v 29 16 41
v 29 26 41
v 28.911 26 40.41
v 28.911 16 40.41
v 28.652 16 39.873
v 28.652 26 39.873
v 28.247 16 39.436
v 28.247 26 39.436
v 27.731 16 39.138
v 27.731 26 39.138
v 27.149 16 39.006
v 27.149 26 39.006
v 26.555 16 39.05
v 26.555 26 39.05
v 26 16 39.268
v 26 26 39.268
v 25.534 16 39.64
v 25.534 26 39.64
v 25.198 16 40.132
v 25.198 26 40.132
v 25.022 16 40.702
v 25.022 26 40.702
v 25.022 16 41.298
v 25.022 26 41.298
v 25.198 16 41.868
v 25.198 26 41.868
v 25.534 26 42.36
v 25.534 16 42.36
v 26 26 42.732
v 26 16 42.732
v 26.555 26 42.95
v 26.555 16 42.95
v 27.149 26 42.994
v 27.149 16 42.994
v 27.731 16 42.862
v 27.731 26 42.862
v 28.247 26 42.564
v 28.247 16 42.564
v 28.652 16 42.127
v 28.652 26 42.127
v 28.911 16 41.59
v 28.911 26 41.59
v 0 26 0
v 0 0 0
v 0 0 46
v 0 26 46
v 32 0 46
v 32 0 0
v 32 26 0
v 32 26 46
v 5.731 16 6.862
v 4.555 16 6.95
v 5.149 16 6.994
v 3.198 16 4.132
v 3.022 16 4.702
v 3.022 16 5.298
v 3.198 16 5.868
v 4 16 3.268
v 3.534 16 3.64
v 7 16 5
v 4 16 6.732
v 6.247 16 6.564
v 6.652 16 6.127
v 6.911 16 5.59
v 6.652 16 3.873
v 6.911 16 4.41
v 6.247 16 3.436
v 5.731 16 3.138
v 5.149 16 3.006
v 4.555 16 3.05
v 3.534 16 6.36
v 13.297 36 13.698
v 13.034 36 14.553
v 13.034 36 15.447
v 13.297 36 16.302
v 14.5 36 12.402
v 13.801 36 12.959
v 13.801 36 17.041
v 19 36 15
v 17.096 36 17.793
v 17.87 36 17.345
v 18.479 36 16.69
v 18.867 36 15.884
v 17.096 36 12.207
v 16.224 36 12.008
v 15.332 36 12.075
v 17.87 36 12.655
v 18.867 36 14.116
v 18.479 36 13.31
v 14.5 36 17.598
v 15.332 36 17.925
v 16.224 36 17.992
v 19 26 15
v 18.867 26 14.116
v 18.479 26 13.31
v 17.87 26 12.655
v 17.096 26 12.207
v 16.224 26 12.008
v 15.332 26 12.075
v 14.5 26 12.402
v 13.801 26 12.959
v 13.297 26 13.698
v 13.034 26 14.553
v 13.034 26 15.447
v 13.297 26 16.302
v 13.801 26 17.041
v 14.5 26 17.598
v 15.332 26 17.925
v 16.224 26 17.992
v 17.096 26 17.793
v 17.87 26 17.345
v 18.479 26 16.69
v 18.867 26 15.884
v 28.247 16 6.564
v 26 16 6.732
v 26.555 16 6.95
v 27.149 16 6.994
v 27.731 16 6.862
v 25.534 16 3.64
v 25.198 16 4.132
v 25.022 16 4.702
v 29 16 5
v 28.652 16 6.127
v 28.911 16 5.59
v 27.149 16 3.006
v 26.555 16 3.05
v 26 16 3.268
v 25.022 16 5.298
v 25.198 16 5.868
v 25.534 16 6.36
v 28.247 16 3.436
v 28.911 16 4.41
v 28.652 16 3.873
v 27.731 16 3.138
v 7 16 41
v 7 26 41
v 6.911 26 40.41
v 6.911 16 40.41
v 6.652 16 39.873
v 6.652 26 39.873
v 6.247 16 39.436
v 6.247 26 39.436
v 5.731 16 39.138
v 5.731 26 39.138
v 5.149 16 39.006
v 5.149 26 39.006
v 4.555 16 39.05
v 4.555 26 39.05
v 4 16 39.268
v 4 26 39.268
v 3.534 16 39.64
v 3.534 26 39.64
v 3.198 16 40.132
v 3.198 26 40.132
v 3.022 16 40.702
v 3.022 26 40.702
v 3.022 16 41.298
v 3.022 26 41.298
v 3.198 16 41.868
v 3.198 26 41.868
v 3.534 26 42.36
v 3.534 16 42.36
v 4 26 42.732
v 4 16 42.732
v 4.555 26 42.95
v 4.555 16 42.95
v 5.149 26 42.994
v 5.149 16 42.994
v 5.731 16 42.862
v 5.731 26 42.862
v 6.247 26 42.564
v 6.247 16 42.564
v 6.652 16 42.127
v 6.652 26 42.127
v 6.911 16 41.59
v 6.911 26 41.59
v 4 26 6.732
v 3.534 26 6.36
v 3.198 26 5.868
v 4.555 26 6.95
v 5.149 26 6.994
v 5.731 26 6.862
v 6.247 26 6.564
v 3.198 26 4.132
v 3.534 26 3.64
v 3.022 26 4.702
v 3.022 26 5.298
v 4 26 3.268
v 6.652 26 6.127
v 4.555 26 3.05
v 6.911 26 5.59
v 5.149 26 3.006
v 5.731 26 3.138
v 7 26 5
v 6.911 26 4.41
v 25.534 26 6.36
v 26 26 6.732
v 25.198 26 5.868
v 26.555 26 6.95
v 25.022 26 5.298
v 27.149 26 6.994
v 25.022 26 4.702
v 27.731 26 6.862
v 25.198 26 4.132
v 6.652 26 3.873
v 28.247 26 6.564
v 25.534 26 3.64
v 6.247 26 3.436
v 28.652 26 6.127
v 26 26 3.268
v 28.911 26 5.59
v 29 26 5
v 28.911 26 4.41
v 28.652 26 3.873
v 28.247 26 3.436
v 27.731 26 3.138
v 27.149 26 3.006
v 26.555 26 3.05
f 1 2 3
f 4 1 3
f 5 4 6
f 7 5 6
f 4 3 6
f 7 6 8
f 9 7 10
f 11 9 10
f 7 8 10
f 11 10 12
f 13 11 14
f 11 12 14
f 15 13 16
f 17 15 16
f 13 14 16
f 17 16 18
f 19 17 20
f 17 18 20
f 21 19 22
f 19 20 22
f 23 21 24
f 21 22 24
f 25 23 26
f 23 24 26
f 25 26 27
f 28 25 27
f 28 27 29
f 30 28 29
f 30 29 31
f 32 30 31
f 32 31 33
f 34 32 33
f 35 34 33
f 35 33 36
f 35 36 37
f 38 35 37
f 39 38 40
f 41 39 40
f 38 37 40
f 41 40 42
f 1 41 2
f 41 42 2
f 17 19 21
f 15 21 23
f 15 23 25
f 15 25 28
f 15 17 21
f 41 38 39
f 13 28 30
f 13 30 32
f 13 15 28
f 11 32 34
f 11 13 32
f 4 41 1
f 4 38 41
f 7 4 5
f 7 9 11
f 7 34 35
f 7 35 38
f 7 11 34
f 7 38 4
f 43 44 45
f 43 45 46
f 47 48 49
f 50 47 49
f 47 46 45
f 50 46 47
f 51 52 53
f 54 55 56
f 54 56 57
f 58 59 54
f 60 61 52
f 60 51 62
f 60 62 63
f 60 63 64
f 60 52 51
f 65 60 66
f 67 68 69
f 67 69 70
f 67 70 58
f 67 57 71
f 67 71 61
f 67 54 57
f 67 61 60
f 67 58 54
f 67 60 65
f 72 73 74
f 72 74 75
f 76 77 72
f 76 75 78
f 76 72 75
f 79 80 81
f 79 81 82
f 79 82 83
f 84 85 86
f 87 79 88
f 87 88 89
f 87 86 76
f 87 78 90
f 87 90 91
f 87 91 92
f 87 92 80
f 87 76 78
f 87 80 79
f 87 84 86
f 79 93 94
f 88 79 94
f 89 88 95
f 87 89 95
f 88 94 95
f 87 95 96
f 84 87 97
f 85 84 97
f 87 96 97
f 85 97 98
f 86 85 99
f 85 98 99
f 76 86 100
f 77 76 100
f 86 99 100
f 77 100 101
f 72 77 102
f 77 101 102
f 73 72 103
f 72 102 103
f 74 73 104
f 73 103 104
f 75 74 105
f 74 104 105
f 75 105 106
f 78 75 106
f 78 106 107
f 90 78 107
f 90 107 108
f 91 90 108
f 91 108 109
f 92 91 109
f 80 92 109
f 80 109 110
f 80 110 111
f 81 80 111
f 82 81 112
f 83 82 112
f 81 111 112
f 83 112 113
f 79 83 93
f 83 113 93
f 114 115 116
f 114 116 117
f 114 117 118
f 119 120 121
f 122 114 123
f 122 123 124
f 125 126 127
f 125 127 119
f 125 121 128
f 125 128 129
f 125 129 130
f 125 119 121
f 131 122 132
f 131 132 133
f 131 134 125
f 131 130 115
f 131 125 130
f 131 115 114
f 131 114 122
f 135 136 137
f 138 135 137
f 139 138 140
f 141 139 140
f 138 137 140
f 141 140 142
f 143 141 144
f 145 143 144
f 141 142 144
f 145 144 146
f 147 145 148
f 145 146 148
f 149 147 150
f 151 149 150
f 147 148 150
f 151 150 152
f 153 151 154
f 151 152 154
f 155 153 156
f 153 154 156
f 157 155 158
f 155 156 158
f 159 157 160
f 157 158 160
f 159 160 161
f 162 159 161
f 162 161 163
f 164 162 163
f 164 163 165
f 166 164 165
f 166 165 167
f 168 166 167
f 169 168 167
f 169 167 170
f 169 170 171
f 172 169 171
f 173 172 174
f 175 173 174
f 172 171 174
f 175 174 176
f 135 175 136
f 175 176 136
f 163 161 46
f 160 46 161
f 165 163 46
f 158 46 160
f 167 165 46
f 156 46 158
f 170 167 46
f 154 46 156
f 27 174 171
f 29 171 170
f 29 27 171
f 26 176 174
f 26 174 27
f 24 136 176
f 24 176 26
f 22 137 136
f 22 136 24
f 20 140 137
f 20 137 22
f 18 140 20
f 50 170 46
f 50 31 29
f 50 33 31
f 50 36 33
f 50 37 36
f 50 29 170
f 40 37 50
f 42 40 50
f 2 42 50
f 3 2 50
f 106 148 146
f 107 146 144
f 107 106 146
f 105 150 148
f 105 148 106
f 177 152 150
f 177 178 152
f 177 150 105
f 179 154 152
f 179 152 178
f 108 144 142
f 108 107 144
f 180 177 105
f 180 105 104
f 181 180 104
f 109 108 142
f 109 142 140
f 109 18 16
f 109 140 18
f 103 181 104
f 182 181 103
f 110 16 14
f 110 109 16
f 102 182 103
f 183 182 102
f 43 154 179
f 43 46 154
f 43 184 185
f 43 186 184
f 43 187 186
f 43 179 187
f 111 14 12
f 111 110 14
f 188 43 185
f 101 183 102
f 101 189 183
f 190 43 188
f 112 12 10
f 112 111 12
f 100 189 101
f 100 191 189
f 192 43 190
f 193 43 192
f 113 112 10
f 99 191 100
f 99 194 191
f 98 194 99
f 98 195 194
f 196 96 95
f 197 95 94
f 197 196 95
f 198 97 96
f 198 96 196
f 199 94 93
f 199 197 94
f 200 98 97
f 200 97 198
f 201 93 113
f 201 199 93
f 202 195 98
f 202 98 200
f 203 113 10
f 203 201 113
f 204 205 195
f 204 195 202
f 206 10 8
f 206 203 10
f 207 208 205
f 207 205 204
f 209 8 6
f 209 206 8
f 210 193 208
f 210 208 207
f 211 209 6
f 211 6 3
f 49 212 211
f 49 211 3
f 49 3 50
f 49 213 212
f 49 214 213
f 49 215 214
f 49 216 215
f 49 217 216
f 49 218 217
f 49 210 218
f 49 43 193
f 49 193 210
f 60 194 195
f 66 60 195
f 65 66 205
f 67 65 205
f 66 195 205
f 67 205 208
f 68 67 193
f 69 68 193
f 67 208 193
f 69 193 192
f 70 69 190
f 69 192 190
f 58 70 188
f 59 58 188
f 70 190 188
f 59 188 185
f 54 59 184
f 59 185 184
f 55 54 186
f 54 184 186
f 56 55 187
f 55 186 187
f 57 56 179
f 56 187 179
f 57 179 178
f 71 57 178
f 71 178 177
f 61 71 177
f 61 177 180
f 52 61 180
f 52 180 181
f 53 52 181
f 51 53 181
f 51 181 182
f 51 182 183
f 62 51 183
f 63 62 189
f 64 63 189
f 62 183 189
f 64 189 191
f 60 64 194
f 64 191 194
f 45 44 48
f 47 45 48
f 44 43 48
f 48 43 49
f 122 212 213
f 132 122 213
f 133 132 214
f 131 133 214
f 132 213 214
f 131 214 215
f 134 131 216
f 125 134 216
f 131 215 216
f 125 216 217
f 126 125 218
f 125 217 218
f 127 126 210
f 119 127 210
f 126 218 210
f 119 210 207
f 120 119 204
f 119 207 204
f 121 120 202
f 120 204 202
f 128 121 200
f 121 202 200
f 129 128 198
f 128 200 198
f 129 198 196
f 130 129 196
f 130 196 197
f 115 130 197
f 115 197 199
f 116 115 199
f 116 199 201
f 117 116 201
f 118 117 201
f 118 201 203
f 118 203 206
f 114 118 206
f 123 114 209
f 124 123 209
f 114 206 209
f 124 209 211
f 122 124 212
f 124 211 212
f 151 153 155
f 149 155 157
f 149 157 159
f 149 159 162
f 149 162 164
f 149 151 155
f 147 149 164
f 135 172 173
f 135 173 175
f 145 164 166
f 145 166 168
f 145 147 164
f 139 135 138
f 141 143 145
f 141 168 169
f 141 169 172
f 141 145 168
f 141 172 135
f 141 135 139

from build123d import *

# Parameters (mm, degrees)
SKETCH2_W            = 32
SKETCH2_H            = 26
BASE_DEPTH           = 46
SKETCH3_R            = 2
MOUNTING_HOLES_DEPTH = 10
SKETCH4_R            = 3
AXLE_DEPTH           = 10


with BuildPart() as part:
    # Sketch2 → base (new body)
    with BuildSketch(Plane.XY):
        with Locations((16, 13)):
            Rectangle(SKETCH2_W, SKETCH2_H)
    extrude(amount=BASE_DEPTH)

    # Sketch3 → mounting holes (cut)
    with BuildSketch(Plane(origin=(0, 26, 0), x_dir=(1, 0, 0), z_dir=(0, 1, 0))):
        with Locations((5, -5)):
            Circle(SKETCH3_R)
        with Locations((27, -5)):
            Circle(SKETCH3_R)
        with Locations((27, -41)):
            Circle(SKETCH3_R)
        with Locations((5, -41)):
            Circle(SKETCH3_R)
    extrude(amount=-MOUNTING_HOLES_DEPTH, mode=Mode.SUBTRACT)

    # Sketch4 → axle (add)
    with BuildSketch(Plane(origin=(0, 26, 0), x_dir=(1, 0, 0), z_dir=(0, 1, 0))):
        with Locations((16, -15)):
            Circle(SKETCH4_R)
    extrude(amount=AXLE_DEPTH)


solid = part.part
